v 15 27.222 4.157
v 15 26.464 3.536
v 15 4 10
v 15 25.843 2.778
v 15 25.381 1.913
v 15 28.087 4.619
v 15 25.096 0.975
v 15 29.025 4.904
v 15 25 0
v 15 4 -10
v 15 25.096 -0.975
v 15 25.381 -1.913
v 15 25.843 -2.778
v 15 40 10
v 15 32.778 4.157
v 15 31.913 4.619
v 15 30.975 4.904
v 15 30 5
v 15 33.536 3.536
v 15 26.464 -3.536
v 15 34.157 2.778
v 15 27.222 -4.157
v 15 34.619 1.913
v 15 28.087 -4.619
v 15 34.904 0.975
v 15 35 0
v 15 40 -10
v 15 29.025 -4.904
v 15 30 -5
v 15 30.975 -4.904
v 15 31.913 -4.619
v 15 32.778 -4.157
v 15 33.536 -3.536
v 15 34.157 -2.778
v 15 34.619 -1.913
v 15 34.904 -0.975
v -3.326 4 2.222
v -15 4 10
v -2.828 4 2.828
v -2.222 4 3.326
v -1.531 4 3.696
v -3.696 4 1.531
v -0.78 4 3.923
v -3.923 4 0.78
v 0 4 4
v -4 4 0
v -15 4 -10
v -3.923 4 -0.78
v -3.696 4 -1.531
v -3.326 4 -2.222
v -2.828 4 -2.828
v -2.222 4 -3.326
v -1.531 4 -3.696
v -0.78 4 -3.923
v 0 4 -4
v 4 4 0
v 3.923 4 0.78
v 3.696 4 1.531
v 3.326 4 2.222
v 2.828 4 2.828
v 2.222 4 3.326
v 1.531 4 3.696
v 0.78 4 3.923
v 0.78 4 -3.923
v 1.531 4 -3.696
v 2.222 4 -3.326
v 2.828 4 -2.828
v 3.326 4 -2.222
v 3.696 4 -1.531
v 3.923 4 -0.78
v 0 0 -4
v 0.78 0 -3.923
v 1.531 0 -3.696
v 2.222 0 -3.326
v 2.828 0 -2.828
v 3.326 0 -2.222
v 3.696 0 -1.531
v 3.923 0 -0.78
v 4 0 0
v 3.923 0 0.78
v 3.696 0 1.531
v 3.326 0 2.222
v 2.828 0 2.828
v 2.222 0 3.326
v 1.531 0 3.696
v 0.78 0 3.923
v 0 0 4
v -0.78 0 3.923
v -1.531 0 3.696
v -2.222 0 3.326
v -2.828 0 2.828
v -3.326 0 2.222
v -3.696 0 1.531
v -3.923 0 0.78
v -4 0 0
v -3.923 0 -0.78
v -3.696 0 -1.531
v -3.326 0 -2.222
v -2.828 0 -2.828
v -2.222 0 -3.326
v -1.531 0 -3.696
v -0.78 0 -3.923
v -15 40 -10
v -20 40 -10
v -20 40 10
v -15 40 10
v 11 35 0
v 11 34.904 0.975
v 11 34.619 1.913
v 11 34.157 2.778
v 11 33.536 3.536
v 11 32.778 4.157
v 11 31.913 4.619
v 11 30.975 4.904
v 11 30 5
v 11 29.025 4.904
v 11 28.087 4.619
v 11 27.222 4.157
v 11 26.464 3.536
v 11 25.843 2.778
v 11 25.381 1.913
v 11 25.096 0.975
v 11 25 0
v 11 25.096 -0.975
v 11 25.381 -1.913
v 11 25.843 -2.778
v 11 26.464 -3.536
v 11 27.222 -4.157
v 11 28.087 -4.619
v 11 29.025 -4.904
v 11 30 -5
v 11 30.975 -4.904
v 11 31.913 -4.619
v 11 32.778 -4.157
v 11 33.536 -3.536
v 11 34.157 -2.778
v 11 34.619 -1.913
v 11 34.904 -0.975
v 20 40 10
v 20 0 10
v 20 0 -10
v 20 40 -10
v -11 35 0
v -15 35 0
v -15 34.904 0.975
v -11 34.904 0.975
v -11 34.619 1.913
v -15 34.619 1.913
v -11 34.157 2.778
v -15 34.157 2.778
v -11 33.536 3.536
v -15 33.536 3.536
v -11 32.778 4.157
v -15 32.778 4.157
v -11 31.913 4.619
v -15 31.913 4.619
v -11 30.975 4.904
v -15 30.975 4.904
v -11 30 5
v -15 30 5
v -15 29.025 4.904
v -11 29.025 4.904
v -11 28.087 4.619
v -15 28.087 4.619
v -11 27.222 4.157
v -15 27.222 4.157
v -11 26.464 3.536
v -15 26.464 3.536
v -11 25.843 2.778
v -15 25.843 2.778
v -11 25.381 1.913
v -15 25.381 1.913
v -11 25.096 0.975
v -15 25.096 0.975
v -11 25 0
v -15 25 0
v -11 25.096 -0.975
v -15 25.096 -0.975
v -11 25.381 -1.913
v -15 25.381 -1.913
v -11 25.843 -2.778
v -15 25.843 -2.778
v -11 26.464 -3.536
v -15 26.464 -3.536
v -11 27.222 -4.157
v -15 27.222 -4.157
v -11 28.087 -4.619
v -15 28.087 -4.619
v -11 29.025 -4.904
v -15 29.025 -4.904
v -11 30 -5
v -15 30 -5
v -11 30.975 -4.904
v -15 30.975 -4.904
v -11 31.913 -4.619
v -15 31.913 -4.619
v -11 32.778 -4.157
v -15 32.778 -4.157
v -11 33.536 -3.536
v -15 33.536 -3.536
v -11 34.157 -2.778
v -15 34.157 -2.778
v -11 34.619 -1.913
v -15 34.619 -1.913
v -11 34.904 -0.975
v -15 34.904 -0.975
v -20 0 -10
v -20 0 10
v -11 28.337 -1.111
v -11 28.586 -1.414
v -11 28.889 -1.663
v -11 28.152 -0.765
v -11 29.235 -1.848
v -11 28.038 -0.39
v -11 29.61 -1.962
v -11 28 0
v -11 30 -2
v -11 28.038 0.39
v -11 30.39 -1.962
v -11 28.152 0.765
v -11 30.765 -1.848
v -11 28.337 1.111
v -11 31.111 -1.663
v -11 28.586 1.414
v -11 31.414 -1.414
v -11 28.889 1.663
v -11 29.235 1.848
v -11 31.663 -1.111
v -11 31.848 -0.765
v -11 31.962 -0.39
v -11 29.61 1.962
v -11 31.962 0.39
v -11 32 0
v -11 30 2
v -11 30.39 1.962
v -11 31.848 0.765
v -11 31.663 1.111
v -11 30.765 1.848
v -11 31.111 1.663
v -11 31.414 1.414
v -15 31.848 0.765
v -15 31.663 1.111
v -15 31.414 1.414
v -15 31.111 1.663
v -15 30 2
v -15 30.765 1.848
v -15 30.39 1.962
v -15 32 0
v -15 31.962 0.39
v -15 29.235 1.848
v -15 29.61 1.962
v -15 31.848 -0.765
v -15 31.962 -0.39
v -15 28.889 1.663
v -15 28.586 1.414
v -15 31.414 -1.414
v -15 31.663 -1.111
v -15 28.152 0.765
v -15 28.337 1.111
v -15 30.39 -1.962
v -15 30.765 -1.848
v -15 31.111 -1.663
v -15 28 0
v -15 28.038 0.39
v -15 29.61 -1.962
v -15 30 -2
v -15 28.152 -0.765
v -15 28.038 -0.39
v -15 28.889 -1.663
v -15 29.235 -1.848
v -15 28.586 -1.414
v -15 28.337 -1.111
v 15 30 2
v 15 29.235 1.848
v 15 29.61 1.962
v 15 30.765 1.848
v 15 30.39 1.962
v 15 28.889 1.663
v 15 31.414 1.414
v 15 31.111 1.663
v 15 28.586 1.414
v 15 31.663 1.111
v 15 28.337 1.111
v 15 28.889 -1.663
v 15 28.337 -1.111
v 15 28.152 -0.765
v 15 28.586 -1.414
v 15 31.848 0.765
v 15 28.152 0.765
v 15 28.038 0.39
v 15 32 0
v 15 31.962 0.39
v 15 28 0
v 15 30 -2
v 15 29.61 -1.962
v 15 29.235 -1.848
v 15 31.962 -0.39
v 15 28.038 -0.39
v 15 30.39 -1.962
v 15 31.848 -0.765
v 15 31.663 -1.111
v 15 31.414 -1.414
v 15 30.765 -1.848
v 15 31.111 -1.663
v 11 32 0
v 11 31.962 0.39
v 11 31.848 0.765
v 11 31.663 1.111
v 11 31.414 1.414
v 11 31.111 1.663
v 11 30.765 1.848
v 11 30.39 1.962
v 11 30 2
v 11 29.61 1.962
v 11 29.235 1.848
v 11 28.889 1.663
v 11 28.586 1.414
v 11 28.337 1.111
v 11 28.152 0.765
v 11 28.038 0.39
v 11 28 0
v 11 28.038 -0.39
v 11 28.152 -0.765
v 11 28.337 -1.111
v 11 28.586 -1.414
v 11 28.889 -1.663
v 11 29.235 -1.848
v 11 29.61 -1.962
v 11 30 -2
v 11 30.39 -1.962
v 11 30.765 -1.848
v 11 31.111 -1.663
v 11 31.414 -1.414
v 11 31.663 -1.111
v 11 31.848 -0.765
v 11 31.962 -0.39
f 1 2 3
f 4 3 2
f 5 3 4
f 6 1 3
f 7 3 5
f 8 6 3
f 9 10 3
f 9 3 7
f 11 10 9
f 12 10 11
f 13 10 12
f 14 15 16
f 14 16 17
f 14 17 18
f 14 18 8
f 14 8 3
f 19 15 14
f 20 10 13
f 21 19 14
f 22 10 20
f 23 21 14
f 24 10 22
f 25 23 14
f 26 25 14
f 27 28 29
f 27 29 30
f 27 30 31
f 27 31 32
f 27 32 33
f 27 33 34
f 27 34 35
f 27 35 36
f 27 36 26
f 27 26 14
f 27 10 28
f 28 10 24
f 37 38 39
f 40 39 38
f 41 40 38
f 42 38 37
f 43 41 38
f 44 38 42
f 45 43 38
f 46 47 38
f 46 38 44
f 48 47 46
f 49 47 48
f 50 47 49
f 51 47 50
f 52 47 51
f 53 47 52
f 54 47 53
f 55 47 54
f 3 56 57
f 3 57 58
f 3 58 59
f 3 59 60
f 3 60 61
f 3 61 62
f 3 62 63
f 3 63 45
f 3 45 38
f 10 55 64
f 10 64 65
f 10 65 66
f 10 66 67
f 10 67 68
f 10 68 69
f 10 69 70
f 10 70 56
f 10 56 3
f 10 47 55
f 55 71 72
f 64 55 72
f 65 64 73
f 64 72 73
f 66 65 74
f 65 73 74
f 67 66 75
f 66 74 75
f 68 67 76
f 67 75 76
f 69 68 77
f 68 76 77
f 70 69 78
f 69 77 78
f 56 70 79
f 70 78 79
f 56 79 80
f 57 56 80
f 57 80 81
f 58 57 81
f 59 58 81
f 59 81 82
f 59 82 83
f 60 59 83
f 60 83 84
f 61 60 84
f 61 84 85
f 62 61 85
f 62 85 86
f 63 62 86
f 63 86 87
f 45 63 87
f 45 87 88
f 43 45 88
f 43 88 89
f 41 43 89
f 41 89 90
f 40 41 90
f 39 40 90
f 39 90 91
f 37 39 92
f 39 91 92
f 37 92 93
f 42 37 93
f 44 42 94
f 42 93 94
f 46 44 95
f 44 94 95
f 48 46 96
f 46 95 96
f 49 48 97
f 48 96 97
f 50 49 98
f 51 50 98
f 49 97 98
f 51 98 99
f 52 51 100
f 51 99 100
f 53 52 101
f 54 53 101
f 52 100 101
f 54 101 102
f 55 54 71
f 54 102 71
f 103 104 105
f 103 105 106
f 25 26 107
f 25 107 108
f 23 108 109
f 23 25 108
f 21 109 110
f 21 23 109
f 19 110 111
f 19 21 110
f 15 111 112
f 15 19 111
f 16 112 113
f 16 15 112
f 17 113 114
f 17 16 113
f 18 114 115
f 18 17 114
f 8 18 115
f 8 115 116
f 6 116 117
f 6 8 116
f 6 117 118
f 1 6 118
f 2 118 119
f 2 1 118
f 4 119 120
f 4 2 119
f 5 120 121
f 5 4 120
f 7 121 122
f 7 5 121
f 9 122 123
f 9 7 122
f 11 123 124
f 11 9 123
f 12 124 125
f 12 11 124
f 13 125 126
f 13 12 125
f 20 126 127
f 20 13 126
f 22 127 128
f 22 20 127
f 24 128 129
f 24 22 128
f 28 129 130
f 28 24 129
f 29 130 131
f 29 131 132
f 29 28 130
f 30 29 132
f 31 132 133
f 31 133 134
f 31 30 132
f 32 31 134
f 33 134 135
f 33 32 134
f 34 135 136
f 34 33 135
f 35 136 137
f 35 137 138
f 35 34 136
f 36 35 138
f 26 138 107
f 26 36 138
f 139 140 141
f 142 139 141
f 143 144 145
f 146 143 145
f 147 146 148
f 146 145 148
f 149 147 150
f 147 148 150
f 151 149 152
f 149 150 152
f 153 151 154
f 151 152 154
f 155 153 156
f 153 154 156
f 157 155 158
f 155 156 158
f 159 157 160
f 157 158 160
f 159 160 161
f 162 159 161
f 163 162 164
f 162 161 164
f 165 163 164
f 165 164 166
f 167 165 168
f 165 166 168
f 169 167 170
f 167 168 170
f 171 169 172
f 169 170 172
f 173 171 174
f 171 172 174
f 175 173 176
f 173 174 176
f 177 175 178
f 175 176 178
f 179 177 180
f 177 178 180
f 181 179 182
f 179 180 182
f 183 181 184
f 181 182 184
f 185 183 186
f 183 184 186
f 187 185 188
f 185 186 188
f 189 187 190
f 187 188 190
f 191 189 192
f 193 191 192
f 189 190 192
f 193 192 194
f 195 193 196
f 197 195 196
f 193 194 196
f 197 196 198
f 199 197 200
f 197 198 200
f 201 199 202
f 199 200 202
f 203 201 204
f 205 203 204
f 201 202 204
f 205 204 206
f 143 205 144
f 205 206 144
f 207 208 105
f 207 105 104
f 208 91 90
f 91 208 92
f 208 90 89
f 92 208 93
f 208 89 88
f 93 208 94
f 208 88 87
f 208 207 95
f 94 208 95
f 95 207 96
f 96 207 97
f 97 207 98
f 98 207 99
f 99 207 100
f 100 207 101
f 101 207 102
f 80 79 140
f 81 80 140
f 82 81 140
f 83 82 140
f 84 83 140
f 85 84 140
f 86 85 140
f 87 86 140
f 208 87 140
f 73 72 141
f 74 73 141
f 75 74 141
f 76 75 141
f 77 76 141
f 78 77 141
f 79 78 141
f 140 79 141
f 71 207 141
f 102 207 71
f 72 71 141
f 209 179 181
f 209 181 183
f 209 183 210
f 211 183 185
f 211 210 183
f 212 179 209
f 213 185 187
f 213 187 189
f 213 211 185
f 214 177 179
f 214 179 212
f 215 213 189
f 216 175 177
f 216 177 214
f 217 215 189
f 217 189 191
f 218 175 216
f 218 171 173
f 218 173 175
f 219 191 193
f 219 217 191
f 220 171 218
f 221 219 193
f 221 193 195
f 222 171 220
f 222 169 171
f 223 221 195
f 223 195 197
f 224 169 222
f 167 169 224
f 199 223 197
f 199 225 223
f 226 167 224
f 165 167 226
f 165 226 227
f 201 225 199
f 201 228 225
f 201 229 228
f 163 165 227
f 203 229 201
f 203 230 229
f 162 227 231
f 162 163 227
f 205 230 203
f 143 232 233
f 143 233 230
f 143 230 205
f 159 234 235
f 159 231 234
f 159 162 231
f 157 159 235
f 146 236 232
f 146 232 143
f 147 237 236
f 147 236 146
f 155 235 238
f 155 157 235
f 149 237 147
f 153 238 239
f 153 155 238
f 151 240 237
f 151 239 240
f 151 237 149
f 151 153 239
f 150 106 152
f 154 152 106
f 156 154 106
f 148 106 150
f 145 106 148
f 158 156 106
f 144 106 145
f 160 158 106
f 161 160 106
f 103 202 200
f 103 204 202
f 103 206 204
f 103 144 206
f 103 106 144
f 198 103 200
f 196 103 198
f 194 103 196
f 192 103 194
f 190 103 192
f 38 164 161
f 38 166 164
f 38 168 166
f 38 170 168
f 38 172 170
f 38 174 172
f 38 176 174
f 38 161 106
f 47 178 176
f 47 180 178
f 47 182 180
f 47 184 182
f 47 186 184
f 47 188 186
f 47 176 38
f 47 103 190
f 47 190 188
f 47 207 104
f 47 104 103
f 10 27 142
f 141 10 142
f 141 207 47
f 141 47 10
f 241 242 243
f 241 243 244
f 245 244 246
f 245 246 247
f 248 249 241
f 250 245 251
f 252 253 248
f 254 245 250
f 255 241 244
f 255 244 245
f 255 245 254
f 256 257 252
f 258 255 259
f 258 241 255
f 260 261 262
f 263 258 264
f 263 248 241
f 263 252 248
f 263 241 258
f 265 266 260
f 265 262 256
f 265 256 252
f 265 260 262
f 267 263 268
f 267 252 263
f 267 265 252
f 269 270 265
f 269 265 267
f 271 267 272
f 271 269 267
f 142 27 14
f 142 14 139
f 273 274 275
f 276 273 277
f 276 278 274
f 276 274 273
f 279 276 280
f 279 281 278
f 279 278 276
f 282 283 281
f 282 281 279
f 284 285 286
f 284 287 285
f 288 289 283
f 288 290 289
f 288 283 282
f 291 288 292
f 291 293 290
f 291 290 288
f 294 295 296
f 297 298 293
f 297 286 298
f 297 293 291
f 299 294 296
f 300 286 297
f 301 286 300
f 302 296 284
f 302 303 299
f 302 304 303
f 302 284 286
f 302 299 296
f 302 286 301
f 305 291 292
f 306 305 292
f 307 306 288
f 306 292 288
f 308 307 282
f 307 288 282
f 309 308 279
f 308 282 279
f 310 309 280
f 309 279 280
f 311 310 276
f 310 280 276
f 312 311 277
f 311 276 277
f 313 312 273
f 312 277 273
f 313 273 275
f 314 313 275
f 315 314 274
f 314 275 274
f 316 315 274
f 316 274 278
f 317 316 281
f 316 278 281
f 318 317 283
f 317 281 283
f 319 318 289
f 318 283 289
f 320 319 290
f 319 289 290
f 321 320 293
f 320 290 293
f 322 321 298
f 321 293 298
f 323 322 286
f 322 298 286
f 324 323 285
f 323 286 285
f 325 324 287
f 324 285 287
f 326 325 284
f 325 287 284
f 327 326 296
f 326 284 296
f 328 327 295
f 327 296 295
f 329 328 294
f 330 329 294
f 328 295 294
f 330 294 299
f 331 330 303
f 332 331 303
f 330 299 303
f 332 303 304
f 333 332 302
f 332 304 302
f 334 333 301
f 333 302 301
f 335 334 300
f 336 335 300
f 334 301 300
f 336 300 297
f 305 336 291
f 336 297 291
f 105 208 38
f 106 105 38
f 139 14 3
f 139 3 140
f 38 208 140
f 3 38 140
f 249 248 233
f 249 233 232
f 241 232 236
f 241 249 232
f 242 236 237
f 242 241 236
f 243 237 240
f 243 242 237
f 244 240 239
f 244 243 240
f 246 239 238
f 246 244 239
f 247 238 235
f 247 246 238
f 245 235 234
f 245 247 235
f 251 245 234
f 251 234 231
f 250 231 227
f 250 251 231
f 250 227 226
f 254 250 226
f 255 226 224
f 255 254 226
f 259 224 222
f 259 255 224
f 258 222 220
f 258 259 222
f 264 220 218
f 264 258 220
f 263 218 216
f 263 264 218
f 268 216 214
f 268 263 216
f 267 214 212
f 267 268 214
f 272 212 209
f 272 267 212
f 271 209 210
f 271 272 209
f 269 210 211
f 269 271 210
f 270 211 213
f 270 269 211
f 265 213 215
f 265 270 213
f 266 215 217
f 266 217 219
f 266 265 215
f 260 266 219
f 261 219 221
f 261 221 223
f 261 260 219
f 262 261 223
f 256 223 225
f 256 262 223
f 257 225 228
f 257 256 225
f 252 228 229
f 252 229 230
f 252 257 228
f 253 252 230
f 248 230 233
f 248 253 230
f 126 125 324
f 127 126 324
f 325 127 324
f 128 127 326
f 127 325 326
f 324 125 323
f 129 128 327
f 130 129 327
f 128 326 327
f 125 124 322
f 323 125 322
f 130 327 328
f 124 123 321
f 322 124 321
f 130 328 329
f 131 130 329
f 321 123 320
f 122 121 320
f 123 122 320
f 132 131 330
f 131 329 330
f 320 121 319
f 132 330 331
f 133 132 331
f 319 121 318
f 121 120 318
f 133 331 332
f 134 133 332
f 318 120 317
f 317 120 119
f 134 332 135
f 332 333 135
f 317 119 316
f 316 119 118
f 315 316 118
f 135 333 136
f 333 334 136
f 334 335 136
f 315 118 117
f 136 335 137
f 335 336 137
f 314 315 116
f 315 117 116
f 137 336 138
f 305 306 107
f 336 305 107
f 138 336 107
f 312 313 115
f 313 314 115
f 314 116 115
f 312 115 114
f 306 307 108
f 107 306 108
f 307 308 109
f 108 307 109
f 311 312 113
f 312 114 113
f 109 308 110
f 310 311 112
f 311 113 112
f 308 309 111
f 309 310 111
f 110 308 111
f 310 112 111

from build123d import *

# Parameters (mm, degrees)
SKETCH_1_W               = 40
SKETCH_1_H               = 20
EXTRUDE_1_DEPTH          = 40
CUT_EXTRUDE_1_DEPTH      = 49.989794856
CUT_EXTRUDE_1_DEPTH_BACK = 49.989794856
SKETCH_4_R               = 4
CUT_EXTRUDE_3_DEPTH      = 46.82575695
SKETCH_5_R               = 5
SKETCH_5_R_2             = 2
EXTRUDE_2_DEPTH          = 4


with BuildPart() as part:
    # 草图1 → 凸台-拉伸1 (new body)
    with BuildSketch(Plane(origin=(0, 0, 0), x_dir=(1, 0, 0), z_dir=(0, 1, 0))):
        Rectangle(SKETCH_1_W, SKETCH_1_H)
    extrude(amount=EXTRUDE_1_DEPTH)

    # 草图2 → 切除-拉伸1 (cut, two sides: drawn at the far end of the back side and taken through both)
    with BuildSketch(Plane.XY.offset(10).offset(-CUT_EXTRUDE_1_DEPTH_BACK)):
        Polygon((-15, 156.301458127), (-15, 40), (-15, 4), (15, 4), (15, 40), (15, 156.301458127), (15, 388.904374382), (-15, 388.904374382), align=None)
    extrude(amount=CUT_EXTRUDE_1_DEPTH + CUT_EXTRUDE_1_DEPTH_BACK, mode=Mode.SUBTRACT)

    # 草图4 → 切除-拉伸3 (cut, through all)
    with BuildSketch(Plane.XZ):
        with Locations(Location((0, 0, 0), (0, 0, 270))):
            Circle(SKETCH_4_R)
    extrude(amount=-CUT_EXTRUDE_3_DEPTH, mode=Mode.SUBTRACT)

    # 草图5 → 凸台-拉伸2 (add)
    with BuildSketch(Plane(origin=(-15, 0, 0), x_dir=(0, 0, -1), z_dir=(1, 0, 0))):
        with Locations(Location((0, 30, 0), (0, 0, 90))):
            Circle(SKETCH_5_R)
        with Locations(Location((0, 30, 0), (0, 0, 90))):
            Circle(SKETCH_5_R_2, mode=Mode.SUBTRACT)
    extrude_2 = extrude(amount=EXTRUDE_2_DEPTH)

    # 镜向1: 凸台-拉伸2 across plane
    add(extrude_2.mirror(Plane(origin=(0, 0, 0), x_dir=(0, 0, 1), z_dir=(1, 0, 0))))


solid = part.part
